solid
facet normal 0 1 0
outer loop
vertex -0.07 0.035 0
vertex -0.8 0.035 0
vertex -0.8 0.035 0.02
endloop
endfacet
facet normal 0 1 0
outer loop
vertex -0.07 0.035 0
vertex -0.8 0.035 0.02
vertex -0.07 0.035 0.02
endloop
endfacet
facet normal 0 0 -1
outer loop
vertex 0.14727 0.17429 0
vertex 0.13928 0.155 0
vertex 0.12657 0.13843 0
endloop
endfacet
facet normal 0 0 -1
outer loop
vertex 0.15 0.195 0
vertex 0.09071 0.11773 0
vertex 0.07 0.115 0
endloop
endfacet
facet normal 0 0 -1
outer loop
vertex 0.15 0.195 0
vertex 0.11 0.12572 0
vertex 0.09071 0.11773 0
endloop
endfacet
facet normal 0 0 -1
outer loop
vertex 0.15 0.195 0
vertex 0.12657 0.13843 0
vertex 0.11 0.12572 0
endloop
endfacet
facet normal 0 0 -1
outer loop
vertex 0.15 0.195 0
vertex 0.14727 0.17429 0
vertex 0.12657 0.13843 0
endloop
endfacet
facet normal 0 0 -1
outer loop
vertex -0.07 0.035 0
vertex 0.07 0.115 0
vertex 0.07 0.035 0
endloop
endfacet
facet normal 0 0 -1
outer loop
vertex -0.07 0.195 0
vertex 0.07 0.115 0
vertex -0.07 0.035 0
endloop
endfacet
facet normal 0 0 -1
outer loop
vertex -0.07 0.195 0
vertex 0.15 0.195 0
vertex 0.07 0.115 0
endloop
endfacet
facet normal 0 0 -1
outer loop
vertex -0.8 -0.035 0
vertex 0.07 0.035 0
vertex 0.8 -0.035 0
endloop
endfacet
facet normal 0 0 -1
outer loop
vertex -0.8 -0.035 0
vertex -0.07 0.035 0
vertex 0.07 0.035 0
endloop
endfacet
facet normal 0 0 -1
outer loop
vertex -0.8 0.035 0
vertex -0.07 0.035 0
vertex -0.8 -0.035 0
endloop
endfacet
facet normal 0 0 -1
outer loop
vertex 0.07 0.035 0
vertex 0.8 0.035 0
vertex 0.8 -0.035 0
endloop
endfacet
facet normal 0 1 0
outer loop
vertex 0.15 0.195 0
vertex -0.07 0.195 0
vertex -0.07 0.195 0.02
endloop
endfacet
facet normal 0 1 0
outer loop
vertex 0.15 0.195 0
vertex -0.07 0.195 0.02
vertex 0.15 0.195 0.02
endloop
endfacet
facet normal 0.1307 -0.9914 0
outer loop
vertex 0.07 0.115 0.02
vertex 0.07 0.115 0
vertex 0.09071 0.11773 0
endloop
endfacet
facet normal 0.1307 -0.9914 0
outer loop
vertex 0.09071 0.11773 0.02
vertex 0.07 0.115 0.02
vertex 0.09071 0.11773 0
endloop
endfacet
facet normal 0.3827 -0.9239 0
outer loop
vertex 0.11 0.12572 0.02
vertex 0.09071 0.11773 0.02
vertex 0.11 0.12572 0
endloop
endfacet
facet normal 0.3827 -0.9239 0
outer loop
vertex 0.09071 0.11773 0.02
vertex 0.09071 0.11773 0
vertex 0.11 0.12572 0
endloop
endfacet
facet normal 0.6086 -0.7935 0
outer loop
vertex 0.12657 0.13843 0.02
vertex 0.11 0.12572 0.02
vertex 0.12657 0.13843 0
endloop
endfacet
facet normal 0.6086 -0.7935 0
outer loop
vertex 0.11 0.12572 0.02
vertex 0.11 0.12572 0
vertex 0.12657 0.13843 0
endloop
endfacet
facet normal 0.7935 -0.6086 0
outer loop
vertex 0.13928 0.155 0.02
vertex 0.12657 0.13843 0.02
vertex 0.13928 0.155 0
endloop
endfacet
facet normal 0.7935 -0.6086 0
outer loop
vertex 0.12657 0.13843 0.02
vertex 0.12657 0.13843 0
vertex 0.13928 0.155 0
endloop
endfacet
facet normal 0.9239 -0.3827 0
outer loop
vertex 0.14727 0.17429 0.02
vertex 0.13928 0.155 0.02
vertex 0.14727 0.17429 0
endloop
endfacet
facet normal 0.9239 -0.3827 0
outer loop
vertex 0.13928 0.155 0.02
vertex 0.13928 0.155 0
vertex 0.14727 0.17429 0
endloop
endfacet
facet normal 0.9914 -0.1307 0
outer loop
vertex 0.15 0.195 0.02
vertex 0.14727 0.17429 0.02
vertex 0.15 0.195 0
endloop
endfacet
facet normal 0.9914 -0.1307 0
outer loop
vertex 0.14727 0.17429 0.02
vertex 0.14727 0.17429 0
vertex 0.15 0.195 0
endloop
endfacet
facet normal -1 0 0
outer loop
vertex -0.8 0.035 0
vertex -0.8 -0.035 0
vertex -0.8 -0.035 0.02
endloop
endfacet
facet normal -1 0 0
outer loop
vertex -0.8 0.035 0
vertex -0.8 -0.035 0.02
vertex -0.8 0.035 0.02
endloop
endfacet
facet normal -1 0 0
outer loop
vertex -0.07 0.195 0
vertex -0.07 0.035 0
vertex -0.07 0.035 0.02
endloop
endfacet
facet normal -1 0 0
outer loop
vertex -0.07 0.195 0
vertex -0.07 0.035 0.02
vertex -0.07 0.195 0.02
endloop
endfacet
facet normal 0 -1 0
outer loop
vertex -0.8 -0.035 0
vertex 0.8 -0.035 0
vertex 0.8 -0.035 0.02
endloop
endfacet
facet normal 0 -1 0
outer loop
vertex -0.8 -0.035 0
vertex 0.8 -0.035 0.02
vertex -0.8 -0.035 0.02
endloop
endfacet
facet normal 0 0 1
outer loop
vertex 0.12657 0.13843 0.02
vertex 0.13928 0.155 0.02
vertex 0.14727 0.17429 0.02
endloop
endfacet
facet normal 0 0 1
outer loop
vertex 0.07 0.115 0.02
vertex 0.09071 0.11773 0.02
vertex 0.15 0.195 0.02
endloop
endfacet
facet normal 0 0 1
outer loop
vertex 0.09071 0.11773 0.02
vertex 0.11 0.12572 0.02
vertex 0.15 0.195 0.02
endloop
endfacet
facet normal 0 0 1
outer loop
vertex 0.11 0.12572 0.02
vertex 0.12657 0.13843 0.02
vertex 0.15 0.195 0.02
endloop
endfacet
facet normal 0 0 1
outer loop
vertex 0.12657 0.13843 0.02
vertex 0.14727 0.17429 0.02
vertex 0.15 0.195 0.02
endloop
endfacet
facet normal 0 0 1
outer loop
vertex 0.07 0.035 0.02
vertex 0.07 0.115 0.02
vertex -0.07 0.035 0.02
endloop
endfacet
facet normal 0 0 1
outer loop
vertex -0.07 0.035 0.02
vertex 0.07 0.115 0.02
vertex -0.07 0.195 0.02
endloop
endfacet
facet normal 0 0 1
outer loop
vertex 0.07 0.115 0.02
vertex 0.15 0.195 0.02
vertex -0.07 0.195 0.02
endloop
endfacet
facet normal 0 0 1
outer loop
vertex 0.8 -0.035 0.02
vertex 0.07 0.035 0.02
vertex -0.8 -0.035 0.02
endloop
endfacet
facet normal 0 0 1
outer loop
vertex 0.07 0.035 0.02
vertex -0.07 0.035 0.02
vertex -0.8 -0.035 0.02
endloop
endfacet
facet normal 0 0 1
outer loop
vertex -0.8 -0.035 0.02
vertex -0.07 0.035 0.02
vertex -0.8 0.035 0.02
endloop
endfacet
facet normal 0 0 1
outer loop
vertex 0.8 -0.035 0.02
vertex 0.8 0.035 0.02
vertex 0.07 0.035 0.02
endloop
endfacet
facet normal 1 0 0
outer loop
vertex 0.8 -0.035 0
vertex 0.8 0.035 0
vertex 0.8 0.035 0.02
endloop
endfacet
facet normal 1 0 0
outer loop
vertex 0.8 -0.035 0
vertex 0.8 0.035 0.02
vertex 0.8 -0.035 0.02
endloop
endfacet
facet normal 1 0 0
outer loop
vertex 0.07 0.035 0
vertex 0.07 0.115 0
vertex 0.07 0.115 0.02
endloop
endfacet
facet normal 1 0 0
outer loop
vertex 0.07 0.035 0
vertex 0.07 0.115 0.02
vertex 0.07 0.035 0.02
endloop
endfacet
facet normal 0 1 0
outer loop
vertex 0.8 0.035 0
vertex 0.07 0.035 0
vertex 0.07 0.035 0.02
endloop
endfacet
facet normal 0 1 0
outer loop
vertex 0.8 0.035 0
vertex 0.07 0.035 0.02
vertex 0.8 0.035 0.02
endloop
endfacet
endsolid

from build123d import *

# Parameters (mm, degrees)
PAD_DEPTH = 0.02


with BuildPart() as part:
    # Sketch → Pad (new body)
    with BuildSketch(Plane.XY):
        with BuildLine():
            Line((0.8, 0.035), (0.8, -0.035))
            Line((0.8, -0.035), (-0.8, -0.035))
            Line((-0.8, -0.035), (-0.8, 0.035))
            Line((-0.8, 0.035), (-0.07, 0.035))
            Line((-0.07, 0.035), (-0.07, 0.195))
            Line((-0.07, 0.195), (0.15, 0.195))
            ThreePointArc((0.07, 0.115), (0.126569, 0.138431), (0.15, 0.195))
            Line((0.07, 0.115), (0.07, 0.035))
            Line((0.07, 0.035), (0.8, 0.035))
        make_face()
    extrude(amount=PAD_DEPTH)


solid = part.part
